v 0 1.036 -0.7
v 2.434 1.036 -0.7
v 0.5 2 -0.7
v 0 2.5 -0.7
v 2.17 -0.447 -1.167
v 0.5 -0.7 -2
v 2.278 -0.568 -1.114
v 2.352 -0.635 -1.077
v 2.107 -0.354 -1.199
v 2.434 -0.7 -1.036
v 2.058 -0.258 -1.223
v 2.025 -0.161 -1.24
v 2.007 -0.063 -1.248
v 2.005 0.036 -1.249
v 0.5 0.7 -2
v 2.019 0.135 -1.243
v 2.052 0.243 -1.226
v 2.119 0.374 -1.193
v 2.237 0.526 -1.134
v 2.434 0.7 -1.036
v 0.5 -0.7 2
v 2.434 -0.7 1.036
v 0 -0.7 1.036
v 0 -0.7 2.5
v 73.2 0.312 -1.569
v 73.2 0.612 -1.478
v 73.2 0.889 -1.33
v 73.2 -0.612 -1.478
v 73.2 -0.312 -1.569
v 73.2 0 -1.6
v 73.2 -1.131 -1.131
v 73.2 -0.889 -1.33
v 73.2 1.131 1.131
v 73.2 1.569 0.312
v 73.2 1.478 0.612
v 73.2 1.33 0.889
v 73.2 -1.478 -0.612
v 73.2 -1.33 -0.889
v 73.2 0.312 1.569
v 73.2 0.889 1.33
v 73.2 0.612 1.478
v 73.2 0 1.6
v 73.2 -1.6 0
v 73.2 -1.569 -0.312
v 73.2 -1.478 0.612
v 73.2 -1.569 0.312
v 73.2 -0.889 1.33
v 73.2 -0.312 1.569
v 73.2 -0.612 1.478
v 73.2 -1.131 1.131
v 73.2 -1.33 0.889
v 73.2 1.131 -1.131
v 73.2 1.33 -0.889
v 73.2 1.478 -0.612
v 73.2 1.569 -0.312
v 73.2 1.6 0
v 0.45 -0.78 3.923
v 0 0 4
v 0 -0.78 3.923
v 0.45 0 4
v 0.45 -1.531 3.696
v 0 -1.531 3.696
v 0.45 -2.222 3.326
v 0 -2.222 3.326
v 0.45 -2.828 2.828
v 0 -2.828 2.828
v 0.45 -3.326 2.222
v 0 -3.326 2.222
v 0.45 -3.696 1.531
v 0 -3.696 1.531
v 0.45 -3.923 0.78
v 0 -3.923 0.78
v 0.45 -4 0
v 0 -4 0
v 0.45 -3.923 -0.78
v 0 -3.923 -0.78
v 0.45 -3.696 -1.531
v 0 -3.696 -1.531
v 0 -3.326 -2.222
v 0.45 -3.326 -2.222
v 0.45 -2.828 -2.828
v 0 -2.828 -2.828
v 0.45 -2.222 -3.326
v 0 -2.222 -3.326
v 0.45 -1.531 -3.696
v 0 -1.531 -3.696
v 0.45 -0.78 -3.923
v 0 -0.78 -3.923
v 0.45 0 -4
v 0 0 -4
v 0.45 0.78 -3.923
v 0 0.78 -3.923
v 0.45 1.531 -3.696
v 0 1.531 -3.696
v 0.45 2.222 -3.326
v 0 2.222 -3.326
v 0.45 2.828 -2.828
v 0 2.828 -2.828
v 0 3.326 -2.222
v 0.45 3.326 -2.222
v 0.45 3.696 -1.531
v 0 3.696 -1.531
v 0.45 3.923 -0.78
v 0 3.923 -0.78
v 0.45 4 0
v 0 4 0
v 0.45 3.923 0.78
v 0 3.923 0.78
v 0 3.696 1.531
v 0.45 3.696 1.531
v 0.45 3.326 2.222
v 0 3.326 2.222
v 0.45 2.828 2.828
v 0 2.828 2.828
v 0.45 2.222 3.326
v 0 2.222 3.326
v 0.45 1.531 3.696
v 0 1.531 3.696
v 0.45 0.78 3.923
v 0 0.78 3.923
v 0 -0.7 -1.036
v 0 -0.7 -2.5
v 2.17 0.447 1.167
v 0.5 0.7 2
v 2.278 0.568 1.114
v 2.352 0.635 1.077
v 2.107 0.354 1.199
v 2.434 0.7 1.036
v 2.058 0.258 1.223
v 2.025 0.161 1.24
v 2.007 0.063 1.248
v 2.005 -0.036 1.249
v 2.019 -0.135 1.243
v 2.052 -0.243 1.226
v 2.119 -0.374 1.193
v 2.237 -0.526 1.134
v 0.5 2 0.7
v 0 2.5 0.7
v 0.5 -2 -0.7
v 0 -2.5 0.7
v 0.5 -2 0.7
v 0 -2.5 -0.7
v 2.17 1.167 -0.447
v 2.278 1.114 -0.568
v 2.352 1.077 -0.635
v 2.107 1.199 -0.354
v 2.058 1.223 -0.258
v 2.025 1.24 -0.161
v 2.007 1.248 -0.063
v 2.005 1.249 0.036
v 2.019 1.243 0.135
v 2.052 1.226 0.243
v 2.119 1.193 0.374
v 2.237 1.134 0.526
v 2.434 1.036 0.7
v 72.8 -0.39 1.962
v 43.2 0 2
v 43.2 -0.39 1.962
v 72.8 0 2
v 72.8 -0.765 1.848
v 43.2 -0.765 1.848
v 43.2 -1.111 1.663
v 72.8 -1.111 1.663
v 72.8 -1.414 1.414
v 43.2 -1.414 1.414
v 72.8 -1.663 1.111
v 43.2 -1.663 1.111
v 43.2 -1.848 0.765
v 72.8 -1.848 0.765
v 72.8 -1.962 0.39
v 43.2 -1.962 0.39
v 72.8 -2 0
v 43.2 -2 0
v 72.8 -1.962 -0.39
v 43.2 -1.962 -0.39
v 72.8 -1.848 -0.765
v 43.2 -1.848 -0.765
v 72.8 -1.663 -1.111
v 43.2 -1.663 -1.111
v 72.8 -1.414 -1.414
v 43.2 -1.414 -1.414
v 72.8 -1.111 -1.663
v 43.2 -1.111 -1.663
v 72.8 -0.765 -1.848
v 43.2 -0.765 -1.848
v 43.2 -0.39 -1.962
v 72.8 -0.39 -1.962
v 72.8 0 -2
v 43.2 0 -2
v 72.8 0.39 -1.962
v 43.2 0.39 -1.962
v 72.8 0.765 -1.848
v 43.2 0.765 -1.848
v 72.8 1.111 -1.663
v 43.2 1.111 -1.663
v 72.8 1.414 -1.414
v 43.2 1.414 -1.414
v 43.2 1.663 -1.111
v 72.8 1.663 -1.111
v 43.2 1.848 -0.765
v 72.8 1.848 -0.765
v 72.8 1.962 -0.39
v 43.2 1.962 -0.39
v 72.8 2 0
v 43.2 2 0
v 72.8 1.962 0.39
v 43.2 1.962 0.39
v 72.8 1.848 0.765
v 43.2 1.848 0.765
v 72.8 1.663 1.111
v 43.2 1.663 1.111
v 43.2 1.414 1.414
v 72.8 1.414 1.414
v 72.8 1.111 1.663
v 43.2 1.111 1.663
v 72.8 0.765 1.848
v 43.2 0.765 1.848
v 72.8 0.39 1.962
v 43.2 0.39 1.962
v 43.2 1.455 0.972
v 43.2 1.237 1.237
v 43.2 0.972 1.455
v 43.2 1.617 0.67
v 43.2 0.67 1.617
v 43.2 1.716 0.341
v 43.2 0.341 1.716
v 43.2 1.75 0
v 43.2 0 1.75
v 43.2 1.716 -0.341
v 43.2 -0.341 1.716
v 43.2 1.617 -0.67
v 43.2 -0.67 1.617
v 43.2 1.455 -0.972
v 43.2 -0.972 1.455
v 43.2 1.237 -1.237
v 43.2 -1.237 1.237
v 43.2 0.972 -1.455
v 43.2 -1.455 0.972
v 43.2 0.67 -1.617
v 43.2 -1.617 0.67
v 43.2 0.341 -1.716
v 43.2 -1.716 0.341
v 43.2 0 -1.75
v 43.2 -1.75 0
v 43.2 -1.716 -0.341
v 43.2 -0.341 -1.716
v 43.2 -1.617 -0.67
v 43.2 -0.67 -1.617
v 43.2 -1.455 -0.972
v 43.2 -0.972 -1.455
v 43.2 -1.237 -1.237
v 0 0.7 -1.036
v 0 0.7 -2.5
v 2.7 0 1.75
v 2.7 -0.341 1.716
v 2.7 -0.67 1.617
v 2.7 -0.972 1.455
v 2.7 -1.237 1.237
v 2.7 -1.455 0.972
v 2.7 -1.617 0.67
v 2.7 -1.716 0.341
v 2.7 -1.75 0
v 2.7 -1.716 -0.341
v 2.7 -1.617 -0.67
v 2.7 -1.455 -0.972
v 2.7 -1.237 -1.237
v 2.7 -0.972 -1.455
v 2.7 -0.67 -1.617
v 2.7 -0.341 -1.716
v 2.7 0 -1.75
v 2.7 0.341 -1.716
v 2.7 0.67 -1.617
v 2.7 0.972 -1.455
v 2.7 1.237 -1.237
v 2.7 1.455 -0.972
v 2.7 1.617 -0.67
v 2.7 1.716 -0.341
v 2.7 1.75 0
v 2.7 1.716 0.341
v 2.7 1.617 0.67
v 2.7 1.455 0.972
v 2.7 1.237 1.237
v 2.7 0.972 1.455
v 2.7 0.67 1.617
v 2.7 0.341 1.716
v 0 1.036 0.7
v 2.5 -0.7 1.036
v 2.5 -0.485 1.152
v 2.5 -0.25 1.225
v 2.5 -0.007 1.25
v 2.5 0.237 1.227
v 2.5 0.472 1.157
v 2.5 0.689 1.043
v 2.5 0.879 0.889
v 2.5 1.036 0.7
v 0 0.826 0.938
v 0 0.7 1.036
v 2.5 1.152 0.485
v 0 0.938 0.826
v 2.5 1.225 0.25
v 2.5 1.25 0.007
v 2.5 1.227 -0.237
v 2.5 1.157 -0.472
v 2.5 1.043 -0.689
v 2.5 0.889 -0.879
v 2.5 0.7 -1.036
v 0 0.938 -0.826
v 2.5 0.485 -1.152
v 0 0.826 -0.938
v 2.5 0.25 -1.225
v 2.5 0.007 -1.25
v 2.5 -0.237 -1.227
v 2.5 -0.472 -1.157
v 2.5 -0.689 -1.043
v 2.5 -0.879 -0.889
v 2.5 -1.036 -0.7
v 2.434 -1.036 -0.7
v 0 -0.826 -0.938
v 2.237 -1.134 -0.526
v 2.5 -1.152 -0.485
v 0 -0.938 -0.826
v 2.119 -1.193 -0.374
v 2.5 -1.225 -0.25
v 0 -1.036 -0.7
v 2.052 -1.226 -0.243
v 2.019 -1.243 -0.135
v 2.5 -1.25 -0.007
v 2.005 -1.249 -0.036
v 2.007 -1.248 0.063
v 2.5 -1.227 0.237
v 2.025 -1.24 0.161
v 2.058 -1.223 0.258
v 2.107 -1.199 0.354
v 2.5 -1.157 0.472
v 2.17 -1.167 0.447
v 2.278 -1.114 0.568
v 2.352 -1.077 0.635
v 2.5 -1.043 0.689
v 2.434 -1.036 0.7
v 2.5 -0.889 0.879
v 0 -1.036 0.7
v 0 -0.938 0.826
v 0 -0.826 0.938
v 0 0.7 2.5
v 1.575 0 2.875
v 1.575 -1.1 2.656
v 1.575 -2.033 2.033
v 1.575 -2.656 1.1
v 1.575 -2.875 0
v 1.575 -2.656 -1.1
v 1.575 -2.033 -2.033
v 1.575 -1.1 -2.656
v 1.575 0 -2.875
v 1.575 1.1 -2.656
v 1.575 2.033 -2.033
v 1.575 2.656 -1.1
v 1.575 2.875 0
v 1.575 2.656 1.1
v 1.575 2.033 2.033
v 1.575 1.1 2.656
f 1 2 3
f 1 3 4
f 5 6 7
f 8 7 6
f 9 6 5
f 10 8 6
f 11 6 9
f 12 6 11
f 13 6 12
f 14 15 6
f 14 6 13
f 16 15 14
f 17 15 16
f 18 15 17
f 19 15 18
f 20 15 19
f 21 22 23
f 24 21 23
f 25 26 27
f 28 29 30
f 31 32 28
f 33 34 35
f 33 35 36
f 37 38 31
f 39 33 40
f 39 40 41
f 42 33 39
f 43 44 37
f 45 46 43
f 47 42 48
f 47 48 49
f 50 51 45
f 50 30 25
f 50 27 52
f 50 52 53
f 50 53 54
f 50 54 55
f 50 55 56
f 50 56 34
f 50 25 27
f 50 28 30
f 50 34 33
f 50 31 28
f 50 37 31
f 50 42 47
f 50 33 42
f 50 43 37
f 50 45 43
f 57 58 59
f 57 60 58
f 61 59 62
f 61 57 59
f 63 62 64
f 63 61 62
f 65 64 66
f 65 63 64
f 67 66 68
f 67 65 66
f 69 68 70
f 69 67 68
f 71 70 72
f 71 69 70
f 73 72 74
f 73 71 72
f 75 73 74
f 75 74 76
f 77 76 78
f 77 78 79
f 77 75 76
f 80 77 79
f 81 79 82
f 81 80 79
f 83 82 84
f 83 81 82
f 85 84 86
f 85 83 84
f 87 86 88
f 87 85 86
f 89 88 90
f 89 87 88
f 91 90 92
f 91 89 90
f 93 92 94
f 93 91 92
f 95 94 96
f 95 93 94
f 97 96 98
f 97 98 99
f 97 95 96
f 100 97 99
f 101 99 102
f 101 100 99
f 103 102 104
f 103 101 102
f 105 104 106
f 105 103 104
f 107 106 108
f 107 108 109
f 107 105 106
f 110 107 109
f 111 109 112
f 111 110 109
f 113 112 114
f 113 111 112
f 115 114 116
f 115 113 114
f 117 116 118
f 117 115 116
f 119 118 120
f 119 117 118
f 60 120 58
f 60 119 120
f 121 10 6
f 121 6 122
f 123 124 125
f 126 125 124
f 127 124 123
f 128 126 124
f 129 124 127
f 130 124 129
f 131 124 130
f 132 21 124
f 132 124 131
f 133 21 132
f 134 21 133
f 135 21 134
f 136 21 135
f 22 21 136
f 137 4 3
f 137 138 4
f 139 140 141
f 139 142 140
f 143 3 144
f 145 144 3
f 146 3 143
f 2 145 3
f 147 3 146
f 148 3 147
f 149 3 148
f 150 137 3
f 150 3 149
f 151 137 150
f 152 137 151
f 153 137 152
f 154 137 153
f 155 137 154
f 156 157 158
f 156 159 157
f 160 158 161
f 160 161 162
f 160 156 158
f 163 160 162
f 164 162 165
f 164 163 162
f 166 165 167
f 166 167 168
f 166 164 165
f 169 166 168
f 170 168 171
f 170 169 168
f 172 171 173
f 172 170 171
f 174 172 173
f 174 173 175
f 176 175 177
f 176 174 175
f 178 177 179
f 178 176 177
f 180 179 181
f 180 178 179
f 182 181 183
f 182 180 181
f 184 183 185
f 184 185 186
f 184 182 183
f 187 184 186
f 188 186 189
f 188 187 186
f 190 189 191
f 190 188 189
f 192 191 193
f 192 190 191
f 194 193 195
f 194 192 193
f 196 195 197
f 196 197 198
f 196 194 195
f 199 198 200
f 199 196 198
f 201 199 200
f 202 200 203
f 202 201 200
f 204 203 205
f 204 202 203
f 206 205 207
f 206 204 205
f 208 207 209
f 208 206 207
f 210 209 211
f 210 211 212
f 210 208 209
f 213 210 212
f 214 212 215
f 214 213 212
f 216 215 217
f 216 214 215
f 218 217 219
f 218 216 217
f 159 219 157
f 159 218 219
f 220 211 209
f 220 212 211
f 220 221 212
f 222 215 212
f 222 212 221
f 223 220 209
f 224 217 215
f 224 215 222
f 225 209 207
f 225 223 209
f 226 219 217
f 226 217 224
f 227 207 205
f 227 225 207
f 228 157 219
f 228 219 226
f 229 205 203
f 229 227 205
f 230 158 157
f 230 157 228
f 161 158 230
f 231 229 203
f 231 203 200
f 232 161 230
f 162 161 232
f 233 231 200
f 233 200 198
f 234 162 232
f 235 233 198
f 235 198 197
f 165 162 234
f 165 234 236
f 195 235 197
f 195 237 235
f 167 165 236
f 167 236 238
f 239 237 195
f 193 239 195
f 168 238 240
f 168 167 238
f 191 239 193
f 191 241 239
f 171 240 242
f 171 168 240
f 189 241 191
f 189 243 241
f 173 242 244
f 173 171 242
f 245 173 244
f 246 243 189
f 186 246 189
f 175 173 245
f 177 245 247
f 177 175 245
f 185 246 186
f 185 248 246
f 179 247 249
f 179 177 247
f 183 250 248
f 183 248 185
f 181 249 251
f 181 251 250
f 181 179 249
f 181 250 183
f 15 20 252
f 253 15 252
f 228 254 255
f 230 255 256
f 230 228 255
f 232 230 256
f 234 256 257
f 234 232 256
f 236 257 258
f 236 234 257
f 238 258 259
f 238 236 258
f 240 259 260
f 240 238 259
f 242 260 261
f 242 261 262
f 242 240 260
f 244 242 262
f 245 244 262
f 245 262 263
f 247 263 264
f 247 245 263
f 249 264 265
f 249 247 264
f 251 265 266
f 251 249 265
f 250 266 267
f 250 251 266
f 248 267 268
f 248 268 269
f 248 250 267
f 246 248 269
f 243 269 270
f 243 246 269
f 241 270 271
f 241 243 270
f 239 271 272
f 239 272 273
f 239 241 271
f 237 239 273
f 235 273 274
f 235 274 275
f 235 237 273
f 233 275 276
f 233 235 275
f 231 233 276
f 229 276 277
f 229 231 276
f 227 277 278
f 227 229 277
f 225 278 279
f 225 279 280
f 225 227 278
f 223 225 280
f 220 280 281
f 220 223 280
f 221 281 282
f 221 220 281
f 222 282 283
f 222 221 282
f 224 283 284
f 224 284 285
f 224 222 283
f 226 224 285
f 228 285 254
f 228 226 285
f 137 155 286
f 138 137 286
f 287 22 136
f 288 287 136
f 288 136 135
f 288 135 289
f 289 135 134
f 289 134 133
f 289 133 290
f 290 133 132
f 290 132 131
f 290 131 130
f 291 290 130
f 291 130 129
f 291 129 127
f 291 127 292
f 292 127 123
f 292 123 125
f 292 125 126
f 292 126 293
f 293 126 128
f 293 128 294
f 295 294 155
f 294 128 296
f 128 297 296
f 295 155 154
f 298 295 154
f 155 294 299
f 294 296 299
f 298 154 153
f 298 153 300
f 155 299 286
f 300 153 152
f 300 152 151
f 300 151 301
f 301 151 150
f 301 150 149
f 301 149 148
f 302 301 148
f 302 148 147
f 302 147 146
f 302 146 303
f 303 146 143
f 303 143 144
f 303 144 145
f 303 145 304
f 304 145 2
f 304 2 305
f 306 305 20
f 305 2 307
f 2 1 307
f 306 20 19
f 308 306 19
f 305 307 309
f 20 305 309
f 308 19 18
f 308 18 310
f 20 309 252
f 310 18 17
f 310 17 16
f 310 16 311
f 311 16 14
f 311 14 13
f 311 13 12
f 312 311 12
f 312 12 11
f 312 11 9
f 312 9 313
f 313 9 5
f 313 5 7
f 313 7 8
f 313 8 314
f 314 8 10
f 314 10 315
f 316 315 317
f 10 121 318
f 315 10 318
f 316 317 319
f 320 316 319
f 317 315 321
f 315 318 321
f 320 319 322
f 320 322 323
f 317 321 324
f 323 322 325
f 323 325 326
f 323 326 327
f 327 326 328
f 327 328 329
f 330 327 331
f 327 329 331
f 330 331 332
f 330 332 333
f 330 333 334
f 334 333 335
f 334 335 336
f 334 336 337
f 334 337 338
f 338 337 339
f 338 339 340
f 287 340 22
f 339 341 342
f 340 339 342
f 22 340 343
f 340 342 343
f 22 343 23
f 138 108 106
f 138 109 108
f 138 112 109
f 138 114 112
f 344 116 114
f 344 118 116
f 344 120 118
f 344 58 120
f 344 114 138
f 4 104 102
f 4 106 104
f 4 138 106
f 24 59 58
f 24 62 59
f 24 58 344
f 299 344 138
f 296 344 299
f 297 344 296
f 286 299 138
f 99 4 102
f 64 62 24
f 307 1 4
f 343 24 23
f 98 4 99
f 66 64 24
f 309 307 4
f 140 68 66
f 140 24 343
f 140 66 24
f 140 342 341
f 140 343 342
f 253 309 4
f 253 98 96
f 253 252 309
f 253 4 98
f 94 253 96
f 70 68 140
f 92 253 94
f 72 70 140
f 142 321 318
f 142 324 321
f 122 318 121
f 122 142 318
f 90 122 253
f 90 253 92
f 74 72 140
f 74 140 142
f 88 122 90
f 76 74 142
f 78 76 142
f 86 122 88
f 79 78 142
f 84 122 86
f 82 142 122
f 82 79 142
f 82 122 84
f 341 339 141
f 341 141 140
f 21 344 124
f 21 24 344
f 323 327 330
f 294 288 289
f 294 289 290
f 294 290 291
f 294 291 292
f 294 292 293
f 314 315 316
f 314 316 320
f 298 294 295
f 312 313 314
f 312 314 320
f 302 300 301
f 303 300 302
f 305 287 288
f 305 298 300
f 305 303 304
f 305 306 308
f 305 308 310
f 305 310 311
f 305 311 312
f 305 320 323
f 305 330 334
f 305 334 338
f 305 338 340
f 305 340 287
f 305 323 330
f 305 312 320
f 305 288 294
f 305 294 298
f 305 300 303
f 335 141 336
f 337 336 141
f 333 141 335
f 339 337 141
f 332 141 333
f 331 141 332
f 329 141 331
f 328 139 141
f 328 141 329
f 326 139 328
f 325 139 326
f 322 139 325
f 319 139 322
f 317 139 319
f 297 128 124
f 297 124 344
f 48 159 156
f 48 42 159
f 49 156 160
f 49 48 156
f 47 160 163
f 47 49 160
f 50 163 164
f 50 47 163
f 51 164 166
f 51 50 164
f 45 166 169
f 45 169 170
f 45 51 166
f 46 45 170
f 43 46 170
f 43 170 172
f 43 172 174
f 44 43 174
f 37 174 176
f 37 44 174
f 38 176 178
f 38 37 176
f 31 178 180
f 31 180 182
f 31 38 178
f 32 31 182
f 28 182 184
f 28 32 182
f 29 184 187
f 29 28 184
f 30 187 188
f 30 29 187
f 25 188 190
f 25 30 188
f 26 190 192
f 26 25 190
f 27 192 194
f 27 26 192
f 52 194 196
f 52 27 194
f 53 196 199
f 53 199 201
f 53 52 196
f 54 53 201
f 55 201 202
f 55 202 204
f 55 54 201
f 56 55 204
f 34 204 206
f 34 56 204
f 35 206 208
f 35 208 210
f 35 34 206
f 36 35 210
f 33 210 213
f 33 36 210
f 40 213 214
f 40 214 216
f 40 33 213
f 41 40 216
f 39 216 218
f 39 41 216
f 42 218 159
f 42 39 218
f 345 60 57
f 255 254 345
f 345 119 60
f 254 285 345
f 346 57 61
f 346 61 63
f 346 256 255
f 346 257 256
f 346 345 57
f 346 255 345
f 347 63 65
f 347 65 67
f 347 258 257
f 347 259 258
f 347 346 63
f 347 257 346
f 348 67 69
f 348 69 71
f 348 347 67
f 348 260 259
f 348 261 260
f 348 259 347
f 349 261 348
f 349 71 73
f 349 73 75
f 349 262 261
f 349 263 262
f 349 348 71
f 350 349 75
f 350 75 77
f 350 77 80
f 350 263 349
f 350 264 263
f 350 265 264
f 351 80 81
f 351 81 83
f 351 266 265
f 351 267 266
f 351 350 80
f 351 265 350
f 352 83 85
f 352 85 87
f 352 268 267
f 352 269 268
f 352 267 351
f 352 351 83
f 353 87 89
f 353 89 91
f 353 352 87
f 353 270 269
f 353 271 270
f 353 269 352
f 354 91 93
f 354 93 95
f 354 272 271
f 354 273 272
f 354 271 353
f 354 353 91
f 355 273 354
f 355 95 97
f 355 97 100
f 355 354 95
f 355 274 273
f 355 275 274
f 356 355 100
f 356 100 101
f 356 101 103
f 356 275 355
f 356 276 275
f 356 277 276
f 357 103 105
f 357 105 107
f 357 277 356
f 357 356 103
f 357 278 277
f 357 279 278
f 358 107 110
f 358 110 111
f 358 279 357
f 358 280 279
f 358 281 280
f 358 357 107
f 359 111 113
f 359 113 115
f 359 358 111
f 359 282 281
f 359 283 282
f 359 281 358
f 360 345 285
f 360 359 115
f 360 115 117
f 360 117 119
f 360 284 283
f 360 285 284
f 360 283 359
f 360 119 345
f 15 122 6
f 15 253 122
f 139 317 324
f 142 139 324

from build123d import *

# Parameters (mm, degrees)
ENL_V_MAT_EXTRU_1_DEPTH      = 0.7
R_P_TITION_CIRCULAIRE1_COUNT = 4
ENL_V_MAT_EXTRU_2_REACH      = 75.418
ESQUISSE3_R                  = 1.25


with BuildPart() as part:
    # Esquisse1 → Révolution1 (revolve)
    with BuildSketch(Plane.XY, mode=Mode.PRIVATE) as r_volution1_sk:
        Polygon((0, 0), (0, 4), (0.45, 4), (2.7, 1.75), (43.2, 1.75), (43.2, 2), (72.8, 2), (73.2, 1.6), (73.2, 0), align=None)
    revolve(r_volution1_sk.sketch.rotate(Axis((0, 0, 0), (1, 0, 0)), 90), axis=Axis((0, 0, 0), (1, 0, 0)))

    # Esquisse2 → Enlèv. mat.-Extru.1 (cut, symmetric)
    with BuildSketch(Plane.XY):
        Polygon((0, 0), (0, 2.5), (0.5, 2), (2.5, 1.002836784), (2.5, 0), align=None)
    enl_v_mat_extru_1 = extrude(amount=ENL_V_MAT_EXTRU_1_DEPTH, both=True, mode=Mode.SUBTRACT)

    # Répétition circulaire1: Enlèv. mat.-Extru.1 ×4 about axis
    r_p_tition_circulaire1_axis = Axis((0, 0, 0), (1, 0, 0))
    for i in range(1, R_P_TITION_CIRCULAIRE1_COUNT):
        add(enl_v_mat_extru_1.rotate(r_p_tition_circulaire1_axis, i * 360 / R_P_TITION_CIRCULAIRE1_COUNT), mode=Mode.SUBTRACT)

    # Enlèv. mat.-Extru.2: up to this face of the body (flat: up to its plane)
    enl_v_mat_extru_2_end = Plane(part.part.faces().sort_by_distance((2.5, 0, 0))[0])
    # Esquisse3 → Enlèv. mat.-Extru.2 (cut, up to the picked face)
    with BuildSketch(Plane.ZY, mode=Mode.PRIVATE) as enl_v_mat_extru_2_sk1:
        with Locations(Location((0, 0, 0), (0, 0, 325.944202257))):
            Circle(ESQUISSE3_R)
    enl_v_mat_extru_2_tool1 = split(extrude(enl_v_mat_extru_2_sk1.sketch, amount=-ENL_V_MAT_EXTRU_2_REACH, mode=Mode.PRIVATE), bisect_by=enl_v_mat_extru_2_end, keep=Keep.BOTH, mode=Mode.PRIVATE)
    add(enl_v_mat_extru_2_tool1.solids().sort_by(Axis((0, 0, 0), (1, 0, 0)))[0], mode=Mode.SUBTRACT)


solid = part.part
